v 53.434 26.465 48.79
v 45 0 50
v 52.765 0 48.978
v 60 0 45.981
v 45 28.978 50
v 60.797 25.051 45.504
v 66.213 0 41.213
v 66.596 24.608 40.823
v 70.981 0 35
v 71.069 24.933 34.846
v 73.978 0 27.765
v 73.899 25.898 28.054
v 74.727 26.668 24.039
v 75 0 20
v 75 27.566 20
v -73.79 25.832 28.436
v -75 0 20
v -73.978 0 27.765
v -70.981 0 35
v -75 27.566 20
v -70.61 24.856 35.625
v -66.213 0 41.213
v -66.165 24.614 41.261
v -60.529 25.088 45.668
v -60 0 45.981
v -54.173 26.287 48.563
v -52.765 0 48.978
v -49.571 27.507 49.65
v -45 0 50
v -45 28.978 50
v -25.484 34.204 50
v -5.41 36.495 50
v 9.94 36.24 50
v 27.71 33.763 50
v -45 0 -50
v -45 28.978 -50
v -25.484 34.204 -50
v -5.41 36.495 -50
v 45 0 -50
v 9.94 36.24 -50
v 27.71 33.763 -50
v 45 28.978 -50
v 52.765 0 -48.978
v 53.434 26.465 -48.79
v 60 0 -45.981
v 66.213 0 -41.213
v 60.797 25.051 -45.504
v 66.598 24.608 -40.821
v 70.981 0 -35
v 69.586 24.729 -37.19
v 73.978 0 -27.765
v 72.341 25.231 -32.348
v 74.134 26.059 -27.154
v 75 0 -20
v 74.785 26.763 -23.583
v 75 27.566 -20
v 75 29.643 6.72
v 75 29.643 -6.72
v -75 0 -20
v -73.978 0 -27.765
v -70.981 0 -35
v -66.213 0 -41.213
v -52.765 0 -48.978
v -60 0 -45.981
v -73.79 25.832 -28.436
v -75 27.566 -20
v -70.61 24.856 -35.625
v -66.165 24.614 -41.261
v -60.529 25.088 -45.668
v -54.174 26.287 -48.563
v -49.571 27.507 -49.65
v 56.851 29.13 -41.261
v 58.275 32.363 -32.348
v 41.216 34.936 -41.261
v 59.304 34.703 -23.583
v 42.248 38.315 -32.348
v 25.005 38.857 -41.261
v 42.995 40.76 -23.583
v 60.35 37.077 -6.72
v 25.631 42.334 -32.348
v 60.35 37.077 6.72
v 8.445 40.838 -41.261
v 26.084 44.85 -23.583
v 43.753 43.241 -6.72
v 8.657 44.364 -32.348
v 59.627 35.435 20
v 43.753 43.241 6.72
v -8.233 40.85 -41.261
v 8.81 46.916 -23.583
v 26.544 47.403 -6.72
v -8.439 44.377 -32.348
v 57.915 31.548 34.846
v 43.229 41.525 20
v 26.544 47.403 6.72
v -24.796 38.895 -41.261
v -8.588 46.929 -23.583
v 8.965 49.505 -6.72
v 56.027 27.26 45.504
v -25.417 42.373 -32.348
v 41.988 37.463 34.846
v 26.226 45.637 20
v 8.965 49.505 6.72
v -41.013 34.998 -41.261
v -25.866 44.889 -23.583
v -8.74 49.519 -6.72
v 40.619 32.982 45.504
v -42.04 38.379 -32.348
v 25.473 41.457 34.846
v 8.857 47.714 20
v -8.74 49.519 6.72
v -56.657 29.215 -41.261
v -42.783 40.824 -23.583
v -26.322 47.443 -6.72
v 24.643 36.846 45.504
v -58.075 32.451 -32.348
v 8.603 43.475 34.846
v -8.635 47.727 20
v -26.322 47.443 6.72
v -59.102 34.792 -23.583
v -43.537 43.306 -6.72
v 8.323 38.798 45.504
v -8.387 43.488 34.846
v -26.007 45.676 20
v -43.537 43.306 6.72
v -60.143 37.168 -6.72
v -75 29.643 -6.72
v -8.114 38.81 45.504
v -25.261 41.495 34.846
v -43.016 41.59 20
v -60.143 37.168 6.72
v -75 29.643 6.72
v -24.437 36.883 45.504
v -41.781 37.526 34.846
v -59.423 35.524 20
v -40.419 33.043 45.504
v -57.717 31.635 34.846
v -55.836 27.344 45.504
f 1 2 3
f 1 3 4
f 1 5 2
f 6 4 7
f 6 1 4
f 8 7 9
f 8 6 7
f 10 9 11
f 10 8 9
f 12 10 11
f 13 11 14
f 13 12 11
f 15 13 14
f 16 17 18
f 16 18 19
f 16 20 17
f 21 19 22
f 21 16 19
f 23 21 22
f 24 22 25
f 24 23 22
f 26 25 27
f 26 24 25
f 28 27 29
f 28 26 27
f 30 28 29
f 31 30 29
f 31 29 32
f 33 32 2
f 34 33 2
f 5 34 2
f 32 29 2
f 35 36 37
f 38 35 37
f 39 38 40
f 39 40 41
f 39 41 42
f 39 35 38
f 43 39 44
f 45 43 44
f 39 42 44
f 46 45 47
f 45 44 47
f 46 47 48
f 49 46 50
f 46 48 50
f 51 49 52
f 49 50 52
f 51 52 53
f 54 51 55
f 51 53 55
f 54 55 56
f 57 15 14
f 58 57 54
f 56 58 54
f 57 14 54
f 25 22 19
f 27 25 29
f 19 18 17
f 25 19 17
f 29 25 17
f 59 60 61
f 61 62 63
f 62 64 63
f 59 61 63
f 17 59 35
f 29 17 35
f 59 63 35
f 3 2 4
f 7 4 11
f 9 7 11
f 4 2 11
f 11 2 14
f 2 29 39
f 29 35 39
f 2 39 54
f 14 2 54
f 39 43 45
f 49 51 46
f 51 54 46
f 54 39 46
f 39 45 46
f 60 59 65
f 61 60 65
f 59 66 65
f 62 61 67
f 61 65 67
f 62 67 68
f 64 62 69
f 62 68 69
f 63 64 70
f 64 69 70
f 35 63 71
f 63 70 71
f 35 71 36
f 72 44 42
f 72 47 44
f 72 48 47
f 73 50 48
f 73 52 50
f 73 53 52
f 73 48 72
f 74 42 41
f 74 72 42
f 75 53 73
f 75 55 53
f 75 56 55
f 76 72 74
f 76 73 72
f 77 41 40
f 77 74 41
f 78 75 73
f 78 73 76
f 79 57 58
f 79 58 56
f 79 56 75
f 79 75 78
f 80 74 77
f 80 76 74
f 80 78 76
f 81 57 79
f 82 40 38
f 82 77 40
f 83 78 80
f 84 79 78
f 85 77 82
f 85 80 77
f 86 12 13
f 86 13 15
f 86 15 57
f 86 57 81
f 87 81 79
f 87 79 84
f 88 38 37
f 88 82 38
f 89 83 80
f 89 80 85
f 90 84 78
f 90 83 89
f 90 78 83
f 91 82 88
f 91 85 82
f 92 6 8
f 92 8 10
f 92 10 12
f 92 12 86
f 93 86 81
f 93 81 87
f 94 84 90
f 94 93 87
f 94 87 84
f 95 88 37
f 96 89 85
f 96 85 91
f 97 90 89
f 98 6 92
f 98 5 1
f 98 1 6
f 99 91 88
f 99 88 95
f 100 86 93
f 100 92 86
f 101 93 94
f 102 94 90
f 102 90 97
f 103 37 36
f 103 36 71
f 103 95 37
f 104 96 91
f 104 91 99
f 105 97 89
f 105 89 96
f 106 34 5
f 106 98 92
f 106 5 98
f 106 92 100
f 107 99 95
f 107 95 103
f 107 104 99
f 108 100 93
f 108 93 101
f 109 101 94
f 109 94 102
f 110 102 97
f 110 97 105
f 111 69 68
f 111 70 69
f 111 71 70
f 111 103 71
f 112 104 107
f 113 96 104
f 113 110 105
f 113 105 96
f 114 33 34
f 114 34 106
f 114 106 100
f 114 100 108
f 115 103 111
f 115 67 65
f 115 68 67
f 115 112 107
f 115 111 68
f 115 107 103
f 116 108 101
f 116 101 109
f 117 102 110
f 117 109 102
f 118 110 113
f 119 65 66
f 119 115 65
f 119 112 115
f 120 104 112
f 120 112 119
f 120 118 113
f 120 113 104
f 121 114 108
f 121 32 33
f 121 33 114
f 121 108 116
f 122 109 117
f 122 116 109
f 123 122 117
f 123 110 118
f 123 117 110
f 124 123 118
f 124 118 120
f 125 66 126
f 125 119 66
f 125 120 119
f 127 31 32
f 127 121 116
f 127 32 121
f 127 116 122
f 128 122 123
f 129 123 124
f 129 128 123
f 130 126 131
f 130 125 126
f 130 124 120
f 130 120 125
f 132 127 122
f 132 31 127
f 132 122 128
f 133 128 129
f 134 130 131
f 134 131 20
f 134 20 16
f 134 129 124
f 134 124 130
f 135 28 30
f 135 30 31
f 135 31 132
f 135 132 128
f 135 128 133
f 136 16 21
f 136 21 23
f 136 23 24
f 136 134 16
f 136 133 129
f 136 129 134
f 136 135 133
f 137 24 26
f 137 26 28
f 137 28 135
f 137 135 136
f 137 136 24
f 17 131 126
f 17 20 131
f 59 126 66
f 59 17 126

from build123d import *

# Parameters (mm, degrees)
ESQUISSE2_W        = 150
ESQUISSE2_H        = 100
BOSS_EXTRU_1_DEPTH = 50
CONG_1_R           = 30


with BuildPart() as part:
    # Esquisse2 → Boss.-Extru.1 (new body)
    with BuildSketch(Plane(origin=(0, 0, 0), x_dir=(1, 0, 0), z_dir=(0, 1, 0))):
        Rectangle(ESQUISSE2_W, ESQUISSE2_H)
    extrude(amount=BOSS_EXTRU_1_DEPTH)

    # Enlèvement de matière-Balayage1: sweep along a path in Esquisse3
    with BuildLine(Plane.XY) as enl_vement_de_mati_re_balayage1_path:
        ThreePointArc((111.803398875, 0), (0, 50), (-111.803398875, 0))
    # Esquisse4 → Enlèvement de matière-Balayage1 (sweep, cut)
    with BuildSketch(Plane(origin=(0, 0, 0), x_dir=(0, 0, -1), z_dir=(1, 0, 0))):
        with BuildLine():
            Line((-86.602540378, 0), (-86.602540378, 100))
            Line((-86.602540378, 100), (86.602540378, 100))
            Line((86.602540378, 100), (86.602540378, 0))
            ThreePointArc((86.602540378, 0), (0, 50), (-86.602540378, 0))
        make_face()
    sweep(path=enl_vement_de_mati_re_balayage1_path.line, mode=Mode.SUBTRACT)

    # Congé1
    cong_1_edges = [part.edges().sort_by_distance(p)[0] for p in [
        (-75, 7.086018511, 50),
        (-75, 7.086018511, -50),
        (75, 7.086018511, -50),
        (75, 7.086018511, 50),
    ]]
    fillet(cong_1_edges, radius=CONG_1_R)


solid = part.part
